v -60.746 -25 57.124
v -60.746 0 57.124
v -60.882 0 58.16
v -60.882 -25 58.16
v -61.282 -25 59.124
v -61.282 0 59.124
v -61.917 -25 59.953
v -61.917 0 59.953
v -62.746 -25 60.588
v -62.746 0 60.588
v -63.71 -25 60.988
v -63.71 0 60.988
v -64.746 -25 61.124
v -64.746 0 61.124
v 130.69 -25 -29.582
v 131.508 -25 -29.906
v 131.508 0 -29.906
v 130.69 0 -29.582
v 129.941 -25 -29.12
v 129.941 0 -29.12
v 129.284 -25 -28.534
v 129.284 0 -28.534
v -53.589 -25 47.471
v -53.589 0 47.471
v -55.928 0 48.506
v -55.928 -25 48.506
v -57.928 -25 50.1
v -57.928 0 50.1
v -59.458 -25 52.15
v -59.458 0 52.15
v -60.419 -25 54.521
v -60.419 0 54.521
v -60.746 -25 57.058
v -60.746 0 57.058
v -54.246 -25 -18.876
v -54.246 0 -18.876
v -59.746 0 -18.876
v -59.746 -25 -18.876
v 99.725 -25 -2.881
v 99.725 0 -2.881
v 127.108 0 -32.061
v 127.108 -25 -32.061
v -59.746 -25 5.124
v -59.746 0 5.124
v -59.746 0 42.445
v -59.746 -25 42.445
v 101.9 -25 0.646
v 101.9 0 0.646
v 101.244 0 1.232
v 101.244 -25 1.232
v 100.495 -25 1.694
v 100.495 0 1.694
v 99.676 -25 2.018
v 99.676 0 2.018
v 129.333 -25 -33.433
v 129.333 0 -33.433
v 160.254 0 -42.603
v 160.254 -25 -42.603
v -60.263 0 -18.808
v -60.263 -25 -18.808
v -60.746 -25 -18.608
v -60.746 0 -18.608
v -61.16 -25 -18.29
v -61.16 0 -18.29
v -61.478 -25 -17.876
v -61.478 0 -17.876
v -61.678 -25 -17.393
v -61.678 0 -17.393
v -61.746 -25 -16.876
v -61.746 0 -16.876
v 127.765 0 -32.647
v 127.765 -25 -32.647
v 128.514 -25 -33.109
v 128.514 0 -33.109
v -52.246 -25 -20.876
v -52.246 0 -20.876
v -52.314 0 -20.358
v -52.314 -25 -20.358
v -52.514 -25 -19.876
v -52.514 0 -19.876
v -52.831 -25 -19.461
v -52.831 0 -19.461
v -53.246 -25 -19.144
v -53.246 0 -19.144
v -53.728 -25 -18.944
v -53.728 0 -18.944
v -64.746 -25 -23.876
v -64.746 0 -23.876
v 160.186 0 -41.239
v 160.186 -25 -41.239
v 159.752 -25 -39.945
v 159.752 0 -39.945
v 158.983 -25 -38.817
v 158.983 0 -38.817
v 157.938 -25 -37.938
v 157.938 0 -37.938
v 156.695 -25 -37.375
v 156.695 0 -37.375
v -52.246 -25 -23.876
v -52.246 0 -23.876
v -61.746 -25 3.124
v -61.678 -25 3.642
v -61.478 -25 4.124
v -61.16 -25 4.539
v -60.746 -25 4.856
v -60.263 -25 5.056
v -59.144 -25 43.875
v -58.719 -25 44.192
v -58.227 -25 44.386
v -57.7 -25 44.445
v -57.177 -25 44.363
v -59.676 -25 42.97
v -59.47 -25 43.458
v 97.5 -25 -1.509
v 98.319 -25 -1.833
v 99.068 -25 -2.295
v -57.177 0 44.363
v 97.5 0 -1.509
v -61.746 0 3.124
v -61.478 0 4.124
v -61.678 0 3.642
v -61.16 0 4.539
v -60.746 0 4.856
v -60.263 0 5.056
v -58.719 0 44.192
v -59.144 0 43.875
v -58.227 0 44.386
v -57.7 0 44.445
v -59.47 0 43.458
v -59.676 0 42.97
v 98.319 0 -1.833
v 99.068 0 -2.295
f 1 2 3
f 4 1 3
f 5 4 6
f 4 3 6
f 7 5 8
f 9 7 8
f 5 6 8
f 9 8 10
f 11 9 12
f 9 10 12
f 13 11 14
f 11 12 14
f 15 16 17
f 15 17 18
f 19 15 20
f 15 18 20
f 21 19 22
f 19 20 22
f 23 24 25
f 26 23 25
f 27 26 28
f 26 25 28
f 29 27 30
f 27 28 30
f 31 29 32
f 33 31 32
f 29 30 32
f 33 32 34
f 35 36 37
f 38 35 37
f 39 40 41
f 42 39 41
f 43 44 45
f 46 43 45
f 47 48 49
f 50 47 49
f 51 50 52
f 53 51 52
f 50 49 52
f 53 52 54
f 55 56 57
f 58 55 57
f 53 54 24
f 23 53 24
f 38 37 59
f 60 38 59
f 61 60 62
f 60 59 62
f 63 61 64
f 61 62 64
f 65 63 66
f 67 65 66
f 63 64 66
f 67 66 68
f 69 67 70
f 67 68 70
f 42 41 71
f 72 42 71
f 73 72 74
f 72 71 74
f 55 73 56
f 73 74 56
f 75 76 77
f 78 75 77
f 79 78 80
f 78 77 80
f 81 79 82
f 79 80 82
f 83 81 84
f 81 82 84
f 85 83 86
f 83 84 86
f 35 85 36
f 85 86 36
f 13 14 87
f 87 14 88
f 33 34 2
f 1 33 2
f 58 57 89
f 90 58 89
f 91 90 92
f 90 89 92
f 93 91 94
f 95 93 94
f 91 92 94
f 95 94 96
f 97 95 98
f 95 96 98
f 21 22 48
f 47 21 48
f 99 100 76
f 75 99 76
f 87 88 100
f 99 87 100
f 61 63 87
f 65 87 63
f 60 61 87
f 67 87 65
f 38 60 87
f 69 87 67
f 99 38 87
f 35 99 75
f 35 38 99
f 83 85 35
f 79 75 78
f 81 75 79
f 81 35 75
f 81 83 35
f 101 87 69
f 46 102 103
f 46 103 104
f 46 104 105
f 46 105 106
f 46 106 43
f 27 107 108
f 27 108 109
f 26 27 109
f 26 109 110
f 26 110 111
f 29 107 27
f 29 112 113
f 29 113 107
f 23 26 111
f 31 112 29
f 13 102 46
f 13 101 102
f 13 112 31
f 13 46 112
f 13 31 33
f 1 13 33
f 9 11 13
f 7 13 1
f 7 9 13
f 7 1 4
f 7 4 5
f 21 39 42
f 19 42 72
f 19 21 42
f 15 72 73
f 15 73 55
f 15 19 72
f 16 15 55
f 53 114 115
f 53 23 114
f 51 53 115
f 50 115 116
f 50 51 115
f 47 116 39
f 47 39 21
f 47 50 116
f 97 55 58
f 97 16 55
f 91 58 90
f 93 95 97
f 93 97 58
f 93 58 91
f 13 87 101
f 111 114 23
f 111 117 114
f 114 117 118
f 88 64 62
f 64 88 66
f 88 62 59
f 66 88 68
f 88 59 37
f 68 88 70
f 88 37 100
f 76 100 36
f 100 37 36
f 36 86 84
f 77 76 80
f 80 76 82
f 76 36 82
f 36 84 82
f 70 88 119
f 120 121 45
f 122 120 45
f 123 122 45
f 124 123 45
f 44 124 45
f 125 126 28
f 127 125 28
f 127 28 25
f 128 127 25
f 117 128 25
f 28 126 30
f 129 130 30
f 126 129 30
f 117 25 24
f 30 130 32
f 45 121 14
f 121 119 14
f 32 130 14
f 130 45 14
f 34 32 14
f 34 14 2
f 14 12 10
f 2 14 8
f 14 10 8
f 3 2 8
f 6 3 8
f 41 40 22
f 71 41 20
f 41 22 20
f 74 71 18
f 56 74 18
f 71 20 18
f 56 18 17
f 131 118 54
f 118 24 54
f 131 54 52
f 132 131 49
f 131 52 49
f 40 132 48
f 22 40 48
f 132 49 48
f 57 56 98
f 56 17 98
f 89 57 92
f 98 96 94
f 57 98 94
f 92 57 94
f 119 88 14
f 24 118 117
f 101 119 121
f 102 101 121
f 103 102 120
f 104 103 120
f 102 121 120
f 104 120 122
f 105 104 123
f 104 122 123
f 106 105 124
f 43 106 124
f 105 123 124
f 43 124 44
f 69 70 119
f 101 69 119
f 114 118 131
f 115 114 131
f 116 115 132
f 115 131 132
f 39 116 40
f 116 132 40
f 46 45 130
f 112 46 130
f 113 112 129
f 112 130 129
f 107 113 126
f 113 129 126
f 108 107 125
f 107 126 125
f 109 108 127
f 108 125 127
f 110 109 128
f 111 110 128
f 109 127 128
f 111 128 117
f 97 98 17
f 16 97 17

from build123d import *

# Parameters (mm, degrees)
F1_DEPTH = 25


with BuildPart() as f1:
    # F0 (on Front) → F1 (new body)
    with BuildSketch(Plane.XZ):
        with BuildLine():
            Line((-64.745709, 61.124308), (-64.745709, -23.875692))
            Line((-64.745709, -23.875692), (-52.245709, -23.875692))
            Line((-52.245709, -23.875692), (-52.245709, -20.875692))
            ThreePointArc((-52.245709, -20.875692), (-52.831495, -19.461478), (-54.245709, -18.875692))
            Line((-54.245709, -18.875692), (-59.745709, -18.875692))
            ThreePointArc((-59.745709, -18.875692), (-61.159922, -18.289905), (-61.745709, -16.875692))
            Line((-61.745709, -16.875692), (-61.745709, 3.124308))
            ThreePointArc((-61.745709, 3.124308), (-61.159922, 4.538522), (-59.745709, 5.124308))
            Line((-59.745709, 5.124308), (-59.745709, 42.445086))
            ThreePointArc((-59.745709, 42.445086), (-58.9421, 44.047786), (-57.177062, 44.362543))
            Line((-57.177062, 44.362543), (97.500285, -1.509033))
            ThreePointArc((97.500285, -1.509033), (98.70368, -2.047171), (99.72461, -2.881111))
            Line((99.72461, -2.881111), (127.108349, -32.060611))
            ThreePointArc((127.108349, -32.060611), (128.129279, -32.89455), (129.332675, -33.432689))
            Line((129.332675, -33.432689), (160.254291, -42.602896))
            ThreePointArc((160.254291, -42.602896), (159.406122, -39.3547), (156.694794, -37.375087))
            Line((156.694794, -37.375087), (131.508298, -29.905705))
            ThreePointArc((131.508298, -29.905705), (130.304903, -29.367566), (129.283973, -28.533627))
            Line((129.283973, -28.533627), (101.900234, 0.645873))
            ThreePointArc((101.900234, 0.645873), (100.879304, 1.479812), (99.675908, 2.017951))
            Line((99.675908, 2.017951), (-53.588942, 47.470632))
            ThreePointArc((-53.588942, 47.470632), (-58.759208, 51.075958), (-60.745709, 57.057917))
            Line((-60.745709, 57.057917), (-60.745709, 57.124308))
            ThreePointArc((-60.745709, 57.124308), (-61.917281, 59.952736), (-64.745709, 61.124308))
        make_face()
    extrude(amount=F1_DEPTH)


solid = f1.part
